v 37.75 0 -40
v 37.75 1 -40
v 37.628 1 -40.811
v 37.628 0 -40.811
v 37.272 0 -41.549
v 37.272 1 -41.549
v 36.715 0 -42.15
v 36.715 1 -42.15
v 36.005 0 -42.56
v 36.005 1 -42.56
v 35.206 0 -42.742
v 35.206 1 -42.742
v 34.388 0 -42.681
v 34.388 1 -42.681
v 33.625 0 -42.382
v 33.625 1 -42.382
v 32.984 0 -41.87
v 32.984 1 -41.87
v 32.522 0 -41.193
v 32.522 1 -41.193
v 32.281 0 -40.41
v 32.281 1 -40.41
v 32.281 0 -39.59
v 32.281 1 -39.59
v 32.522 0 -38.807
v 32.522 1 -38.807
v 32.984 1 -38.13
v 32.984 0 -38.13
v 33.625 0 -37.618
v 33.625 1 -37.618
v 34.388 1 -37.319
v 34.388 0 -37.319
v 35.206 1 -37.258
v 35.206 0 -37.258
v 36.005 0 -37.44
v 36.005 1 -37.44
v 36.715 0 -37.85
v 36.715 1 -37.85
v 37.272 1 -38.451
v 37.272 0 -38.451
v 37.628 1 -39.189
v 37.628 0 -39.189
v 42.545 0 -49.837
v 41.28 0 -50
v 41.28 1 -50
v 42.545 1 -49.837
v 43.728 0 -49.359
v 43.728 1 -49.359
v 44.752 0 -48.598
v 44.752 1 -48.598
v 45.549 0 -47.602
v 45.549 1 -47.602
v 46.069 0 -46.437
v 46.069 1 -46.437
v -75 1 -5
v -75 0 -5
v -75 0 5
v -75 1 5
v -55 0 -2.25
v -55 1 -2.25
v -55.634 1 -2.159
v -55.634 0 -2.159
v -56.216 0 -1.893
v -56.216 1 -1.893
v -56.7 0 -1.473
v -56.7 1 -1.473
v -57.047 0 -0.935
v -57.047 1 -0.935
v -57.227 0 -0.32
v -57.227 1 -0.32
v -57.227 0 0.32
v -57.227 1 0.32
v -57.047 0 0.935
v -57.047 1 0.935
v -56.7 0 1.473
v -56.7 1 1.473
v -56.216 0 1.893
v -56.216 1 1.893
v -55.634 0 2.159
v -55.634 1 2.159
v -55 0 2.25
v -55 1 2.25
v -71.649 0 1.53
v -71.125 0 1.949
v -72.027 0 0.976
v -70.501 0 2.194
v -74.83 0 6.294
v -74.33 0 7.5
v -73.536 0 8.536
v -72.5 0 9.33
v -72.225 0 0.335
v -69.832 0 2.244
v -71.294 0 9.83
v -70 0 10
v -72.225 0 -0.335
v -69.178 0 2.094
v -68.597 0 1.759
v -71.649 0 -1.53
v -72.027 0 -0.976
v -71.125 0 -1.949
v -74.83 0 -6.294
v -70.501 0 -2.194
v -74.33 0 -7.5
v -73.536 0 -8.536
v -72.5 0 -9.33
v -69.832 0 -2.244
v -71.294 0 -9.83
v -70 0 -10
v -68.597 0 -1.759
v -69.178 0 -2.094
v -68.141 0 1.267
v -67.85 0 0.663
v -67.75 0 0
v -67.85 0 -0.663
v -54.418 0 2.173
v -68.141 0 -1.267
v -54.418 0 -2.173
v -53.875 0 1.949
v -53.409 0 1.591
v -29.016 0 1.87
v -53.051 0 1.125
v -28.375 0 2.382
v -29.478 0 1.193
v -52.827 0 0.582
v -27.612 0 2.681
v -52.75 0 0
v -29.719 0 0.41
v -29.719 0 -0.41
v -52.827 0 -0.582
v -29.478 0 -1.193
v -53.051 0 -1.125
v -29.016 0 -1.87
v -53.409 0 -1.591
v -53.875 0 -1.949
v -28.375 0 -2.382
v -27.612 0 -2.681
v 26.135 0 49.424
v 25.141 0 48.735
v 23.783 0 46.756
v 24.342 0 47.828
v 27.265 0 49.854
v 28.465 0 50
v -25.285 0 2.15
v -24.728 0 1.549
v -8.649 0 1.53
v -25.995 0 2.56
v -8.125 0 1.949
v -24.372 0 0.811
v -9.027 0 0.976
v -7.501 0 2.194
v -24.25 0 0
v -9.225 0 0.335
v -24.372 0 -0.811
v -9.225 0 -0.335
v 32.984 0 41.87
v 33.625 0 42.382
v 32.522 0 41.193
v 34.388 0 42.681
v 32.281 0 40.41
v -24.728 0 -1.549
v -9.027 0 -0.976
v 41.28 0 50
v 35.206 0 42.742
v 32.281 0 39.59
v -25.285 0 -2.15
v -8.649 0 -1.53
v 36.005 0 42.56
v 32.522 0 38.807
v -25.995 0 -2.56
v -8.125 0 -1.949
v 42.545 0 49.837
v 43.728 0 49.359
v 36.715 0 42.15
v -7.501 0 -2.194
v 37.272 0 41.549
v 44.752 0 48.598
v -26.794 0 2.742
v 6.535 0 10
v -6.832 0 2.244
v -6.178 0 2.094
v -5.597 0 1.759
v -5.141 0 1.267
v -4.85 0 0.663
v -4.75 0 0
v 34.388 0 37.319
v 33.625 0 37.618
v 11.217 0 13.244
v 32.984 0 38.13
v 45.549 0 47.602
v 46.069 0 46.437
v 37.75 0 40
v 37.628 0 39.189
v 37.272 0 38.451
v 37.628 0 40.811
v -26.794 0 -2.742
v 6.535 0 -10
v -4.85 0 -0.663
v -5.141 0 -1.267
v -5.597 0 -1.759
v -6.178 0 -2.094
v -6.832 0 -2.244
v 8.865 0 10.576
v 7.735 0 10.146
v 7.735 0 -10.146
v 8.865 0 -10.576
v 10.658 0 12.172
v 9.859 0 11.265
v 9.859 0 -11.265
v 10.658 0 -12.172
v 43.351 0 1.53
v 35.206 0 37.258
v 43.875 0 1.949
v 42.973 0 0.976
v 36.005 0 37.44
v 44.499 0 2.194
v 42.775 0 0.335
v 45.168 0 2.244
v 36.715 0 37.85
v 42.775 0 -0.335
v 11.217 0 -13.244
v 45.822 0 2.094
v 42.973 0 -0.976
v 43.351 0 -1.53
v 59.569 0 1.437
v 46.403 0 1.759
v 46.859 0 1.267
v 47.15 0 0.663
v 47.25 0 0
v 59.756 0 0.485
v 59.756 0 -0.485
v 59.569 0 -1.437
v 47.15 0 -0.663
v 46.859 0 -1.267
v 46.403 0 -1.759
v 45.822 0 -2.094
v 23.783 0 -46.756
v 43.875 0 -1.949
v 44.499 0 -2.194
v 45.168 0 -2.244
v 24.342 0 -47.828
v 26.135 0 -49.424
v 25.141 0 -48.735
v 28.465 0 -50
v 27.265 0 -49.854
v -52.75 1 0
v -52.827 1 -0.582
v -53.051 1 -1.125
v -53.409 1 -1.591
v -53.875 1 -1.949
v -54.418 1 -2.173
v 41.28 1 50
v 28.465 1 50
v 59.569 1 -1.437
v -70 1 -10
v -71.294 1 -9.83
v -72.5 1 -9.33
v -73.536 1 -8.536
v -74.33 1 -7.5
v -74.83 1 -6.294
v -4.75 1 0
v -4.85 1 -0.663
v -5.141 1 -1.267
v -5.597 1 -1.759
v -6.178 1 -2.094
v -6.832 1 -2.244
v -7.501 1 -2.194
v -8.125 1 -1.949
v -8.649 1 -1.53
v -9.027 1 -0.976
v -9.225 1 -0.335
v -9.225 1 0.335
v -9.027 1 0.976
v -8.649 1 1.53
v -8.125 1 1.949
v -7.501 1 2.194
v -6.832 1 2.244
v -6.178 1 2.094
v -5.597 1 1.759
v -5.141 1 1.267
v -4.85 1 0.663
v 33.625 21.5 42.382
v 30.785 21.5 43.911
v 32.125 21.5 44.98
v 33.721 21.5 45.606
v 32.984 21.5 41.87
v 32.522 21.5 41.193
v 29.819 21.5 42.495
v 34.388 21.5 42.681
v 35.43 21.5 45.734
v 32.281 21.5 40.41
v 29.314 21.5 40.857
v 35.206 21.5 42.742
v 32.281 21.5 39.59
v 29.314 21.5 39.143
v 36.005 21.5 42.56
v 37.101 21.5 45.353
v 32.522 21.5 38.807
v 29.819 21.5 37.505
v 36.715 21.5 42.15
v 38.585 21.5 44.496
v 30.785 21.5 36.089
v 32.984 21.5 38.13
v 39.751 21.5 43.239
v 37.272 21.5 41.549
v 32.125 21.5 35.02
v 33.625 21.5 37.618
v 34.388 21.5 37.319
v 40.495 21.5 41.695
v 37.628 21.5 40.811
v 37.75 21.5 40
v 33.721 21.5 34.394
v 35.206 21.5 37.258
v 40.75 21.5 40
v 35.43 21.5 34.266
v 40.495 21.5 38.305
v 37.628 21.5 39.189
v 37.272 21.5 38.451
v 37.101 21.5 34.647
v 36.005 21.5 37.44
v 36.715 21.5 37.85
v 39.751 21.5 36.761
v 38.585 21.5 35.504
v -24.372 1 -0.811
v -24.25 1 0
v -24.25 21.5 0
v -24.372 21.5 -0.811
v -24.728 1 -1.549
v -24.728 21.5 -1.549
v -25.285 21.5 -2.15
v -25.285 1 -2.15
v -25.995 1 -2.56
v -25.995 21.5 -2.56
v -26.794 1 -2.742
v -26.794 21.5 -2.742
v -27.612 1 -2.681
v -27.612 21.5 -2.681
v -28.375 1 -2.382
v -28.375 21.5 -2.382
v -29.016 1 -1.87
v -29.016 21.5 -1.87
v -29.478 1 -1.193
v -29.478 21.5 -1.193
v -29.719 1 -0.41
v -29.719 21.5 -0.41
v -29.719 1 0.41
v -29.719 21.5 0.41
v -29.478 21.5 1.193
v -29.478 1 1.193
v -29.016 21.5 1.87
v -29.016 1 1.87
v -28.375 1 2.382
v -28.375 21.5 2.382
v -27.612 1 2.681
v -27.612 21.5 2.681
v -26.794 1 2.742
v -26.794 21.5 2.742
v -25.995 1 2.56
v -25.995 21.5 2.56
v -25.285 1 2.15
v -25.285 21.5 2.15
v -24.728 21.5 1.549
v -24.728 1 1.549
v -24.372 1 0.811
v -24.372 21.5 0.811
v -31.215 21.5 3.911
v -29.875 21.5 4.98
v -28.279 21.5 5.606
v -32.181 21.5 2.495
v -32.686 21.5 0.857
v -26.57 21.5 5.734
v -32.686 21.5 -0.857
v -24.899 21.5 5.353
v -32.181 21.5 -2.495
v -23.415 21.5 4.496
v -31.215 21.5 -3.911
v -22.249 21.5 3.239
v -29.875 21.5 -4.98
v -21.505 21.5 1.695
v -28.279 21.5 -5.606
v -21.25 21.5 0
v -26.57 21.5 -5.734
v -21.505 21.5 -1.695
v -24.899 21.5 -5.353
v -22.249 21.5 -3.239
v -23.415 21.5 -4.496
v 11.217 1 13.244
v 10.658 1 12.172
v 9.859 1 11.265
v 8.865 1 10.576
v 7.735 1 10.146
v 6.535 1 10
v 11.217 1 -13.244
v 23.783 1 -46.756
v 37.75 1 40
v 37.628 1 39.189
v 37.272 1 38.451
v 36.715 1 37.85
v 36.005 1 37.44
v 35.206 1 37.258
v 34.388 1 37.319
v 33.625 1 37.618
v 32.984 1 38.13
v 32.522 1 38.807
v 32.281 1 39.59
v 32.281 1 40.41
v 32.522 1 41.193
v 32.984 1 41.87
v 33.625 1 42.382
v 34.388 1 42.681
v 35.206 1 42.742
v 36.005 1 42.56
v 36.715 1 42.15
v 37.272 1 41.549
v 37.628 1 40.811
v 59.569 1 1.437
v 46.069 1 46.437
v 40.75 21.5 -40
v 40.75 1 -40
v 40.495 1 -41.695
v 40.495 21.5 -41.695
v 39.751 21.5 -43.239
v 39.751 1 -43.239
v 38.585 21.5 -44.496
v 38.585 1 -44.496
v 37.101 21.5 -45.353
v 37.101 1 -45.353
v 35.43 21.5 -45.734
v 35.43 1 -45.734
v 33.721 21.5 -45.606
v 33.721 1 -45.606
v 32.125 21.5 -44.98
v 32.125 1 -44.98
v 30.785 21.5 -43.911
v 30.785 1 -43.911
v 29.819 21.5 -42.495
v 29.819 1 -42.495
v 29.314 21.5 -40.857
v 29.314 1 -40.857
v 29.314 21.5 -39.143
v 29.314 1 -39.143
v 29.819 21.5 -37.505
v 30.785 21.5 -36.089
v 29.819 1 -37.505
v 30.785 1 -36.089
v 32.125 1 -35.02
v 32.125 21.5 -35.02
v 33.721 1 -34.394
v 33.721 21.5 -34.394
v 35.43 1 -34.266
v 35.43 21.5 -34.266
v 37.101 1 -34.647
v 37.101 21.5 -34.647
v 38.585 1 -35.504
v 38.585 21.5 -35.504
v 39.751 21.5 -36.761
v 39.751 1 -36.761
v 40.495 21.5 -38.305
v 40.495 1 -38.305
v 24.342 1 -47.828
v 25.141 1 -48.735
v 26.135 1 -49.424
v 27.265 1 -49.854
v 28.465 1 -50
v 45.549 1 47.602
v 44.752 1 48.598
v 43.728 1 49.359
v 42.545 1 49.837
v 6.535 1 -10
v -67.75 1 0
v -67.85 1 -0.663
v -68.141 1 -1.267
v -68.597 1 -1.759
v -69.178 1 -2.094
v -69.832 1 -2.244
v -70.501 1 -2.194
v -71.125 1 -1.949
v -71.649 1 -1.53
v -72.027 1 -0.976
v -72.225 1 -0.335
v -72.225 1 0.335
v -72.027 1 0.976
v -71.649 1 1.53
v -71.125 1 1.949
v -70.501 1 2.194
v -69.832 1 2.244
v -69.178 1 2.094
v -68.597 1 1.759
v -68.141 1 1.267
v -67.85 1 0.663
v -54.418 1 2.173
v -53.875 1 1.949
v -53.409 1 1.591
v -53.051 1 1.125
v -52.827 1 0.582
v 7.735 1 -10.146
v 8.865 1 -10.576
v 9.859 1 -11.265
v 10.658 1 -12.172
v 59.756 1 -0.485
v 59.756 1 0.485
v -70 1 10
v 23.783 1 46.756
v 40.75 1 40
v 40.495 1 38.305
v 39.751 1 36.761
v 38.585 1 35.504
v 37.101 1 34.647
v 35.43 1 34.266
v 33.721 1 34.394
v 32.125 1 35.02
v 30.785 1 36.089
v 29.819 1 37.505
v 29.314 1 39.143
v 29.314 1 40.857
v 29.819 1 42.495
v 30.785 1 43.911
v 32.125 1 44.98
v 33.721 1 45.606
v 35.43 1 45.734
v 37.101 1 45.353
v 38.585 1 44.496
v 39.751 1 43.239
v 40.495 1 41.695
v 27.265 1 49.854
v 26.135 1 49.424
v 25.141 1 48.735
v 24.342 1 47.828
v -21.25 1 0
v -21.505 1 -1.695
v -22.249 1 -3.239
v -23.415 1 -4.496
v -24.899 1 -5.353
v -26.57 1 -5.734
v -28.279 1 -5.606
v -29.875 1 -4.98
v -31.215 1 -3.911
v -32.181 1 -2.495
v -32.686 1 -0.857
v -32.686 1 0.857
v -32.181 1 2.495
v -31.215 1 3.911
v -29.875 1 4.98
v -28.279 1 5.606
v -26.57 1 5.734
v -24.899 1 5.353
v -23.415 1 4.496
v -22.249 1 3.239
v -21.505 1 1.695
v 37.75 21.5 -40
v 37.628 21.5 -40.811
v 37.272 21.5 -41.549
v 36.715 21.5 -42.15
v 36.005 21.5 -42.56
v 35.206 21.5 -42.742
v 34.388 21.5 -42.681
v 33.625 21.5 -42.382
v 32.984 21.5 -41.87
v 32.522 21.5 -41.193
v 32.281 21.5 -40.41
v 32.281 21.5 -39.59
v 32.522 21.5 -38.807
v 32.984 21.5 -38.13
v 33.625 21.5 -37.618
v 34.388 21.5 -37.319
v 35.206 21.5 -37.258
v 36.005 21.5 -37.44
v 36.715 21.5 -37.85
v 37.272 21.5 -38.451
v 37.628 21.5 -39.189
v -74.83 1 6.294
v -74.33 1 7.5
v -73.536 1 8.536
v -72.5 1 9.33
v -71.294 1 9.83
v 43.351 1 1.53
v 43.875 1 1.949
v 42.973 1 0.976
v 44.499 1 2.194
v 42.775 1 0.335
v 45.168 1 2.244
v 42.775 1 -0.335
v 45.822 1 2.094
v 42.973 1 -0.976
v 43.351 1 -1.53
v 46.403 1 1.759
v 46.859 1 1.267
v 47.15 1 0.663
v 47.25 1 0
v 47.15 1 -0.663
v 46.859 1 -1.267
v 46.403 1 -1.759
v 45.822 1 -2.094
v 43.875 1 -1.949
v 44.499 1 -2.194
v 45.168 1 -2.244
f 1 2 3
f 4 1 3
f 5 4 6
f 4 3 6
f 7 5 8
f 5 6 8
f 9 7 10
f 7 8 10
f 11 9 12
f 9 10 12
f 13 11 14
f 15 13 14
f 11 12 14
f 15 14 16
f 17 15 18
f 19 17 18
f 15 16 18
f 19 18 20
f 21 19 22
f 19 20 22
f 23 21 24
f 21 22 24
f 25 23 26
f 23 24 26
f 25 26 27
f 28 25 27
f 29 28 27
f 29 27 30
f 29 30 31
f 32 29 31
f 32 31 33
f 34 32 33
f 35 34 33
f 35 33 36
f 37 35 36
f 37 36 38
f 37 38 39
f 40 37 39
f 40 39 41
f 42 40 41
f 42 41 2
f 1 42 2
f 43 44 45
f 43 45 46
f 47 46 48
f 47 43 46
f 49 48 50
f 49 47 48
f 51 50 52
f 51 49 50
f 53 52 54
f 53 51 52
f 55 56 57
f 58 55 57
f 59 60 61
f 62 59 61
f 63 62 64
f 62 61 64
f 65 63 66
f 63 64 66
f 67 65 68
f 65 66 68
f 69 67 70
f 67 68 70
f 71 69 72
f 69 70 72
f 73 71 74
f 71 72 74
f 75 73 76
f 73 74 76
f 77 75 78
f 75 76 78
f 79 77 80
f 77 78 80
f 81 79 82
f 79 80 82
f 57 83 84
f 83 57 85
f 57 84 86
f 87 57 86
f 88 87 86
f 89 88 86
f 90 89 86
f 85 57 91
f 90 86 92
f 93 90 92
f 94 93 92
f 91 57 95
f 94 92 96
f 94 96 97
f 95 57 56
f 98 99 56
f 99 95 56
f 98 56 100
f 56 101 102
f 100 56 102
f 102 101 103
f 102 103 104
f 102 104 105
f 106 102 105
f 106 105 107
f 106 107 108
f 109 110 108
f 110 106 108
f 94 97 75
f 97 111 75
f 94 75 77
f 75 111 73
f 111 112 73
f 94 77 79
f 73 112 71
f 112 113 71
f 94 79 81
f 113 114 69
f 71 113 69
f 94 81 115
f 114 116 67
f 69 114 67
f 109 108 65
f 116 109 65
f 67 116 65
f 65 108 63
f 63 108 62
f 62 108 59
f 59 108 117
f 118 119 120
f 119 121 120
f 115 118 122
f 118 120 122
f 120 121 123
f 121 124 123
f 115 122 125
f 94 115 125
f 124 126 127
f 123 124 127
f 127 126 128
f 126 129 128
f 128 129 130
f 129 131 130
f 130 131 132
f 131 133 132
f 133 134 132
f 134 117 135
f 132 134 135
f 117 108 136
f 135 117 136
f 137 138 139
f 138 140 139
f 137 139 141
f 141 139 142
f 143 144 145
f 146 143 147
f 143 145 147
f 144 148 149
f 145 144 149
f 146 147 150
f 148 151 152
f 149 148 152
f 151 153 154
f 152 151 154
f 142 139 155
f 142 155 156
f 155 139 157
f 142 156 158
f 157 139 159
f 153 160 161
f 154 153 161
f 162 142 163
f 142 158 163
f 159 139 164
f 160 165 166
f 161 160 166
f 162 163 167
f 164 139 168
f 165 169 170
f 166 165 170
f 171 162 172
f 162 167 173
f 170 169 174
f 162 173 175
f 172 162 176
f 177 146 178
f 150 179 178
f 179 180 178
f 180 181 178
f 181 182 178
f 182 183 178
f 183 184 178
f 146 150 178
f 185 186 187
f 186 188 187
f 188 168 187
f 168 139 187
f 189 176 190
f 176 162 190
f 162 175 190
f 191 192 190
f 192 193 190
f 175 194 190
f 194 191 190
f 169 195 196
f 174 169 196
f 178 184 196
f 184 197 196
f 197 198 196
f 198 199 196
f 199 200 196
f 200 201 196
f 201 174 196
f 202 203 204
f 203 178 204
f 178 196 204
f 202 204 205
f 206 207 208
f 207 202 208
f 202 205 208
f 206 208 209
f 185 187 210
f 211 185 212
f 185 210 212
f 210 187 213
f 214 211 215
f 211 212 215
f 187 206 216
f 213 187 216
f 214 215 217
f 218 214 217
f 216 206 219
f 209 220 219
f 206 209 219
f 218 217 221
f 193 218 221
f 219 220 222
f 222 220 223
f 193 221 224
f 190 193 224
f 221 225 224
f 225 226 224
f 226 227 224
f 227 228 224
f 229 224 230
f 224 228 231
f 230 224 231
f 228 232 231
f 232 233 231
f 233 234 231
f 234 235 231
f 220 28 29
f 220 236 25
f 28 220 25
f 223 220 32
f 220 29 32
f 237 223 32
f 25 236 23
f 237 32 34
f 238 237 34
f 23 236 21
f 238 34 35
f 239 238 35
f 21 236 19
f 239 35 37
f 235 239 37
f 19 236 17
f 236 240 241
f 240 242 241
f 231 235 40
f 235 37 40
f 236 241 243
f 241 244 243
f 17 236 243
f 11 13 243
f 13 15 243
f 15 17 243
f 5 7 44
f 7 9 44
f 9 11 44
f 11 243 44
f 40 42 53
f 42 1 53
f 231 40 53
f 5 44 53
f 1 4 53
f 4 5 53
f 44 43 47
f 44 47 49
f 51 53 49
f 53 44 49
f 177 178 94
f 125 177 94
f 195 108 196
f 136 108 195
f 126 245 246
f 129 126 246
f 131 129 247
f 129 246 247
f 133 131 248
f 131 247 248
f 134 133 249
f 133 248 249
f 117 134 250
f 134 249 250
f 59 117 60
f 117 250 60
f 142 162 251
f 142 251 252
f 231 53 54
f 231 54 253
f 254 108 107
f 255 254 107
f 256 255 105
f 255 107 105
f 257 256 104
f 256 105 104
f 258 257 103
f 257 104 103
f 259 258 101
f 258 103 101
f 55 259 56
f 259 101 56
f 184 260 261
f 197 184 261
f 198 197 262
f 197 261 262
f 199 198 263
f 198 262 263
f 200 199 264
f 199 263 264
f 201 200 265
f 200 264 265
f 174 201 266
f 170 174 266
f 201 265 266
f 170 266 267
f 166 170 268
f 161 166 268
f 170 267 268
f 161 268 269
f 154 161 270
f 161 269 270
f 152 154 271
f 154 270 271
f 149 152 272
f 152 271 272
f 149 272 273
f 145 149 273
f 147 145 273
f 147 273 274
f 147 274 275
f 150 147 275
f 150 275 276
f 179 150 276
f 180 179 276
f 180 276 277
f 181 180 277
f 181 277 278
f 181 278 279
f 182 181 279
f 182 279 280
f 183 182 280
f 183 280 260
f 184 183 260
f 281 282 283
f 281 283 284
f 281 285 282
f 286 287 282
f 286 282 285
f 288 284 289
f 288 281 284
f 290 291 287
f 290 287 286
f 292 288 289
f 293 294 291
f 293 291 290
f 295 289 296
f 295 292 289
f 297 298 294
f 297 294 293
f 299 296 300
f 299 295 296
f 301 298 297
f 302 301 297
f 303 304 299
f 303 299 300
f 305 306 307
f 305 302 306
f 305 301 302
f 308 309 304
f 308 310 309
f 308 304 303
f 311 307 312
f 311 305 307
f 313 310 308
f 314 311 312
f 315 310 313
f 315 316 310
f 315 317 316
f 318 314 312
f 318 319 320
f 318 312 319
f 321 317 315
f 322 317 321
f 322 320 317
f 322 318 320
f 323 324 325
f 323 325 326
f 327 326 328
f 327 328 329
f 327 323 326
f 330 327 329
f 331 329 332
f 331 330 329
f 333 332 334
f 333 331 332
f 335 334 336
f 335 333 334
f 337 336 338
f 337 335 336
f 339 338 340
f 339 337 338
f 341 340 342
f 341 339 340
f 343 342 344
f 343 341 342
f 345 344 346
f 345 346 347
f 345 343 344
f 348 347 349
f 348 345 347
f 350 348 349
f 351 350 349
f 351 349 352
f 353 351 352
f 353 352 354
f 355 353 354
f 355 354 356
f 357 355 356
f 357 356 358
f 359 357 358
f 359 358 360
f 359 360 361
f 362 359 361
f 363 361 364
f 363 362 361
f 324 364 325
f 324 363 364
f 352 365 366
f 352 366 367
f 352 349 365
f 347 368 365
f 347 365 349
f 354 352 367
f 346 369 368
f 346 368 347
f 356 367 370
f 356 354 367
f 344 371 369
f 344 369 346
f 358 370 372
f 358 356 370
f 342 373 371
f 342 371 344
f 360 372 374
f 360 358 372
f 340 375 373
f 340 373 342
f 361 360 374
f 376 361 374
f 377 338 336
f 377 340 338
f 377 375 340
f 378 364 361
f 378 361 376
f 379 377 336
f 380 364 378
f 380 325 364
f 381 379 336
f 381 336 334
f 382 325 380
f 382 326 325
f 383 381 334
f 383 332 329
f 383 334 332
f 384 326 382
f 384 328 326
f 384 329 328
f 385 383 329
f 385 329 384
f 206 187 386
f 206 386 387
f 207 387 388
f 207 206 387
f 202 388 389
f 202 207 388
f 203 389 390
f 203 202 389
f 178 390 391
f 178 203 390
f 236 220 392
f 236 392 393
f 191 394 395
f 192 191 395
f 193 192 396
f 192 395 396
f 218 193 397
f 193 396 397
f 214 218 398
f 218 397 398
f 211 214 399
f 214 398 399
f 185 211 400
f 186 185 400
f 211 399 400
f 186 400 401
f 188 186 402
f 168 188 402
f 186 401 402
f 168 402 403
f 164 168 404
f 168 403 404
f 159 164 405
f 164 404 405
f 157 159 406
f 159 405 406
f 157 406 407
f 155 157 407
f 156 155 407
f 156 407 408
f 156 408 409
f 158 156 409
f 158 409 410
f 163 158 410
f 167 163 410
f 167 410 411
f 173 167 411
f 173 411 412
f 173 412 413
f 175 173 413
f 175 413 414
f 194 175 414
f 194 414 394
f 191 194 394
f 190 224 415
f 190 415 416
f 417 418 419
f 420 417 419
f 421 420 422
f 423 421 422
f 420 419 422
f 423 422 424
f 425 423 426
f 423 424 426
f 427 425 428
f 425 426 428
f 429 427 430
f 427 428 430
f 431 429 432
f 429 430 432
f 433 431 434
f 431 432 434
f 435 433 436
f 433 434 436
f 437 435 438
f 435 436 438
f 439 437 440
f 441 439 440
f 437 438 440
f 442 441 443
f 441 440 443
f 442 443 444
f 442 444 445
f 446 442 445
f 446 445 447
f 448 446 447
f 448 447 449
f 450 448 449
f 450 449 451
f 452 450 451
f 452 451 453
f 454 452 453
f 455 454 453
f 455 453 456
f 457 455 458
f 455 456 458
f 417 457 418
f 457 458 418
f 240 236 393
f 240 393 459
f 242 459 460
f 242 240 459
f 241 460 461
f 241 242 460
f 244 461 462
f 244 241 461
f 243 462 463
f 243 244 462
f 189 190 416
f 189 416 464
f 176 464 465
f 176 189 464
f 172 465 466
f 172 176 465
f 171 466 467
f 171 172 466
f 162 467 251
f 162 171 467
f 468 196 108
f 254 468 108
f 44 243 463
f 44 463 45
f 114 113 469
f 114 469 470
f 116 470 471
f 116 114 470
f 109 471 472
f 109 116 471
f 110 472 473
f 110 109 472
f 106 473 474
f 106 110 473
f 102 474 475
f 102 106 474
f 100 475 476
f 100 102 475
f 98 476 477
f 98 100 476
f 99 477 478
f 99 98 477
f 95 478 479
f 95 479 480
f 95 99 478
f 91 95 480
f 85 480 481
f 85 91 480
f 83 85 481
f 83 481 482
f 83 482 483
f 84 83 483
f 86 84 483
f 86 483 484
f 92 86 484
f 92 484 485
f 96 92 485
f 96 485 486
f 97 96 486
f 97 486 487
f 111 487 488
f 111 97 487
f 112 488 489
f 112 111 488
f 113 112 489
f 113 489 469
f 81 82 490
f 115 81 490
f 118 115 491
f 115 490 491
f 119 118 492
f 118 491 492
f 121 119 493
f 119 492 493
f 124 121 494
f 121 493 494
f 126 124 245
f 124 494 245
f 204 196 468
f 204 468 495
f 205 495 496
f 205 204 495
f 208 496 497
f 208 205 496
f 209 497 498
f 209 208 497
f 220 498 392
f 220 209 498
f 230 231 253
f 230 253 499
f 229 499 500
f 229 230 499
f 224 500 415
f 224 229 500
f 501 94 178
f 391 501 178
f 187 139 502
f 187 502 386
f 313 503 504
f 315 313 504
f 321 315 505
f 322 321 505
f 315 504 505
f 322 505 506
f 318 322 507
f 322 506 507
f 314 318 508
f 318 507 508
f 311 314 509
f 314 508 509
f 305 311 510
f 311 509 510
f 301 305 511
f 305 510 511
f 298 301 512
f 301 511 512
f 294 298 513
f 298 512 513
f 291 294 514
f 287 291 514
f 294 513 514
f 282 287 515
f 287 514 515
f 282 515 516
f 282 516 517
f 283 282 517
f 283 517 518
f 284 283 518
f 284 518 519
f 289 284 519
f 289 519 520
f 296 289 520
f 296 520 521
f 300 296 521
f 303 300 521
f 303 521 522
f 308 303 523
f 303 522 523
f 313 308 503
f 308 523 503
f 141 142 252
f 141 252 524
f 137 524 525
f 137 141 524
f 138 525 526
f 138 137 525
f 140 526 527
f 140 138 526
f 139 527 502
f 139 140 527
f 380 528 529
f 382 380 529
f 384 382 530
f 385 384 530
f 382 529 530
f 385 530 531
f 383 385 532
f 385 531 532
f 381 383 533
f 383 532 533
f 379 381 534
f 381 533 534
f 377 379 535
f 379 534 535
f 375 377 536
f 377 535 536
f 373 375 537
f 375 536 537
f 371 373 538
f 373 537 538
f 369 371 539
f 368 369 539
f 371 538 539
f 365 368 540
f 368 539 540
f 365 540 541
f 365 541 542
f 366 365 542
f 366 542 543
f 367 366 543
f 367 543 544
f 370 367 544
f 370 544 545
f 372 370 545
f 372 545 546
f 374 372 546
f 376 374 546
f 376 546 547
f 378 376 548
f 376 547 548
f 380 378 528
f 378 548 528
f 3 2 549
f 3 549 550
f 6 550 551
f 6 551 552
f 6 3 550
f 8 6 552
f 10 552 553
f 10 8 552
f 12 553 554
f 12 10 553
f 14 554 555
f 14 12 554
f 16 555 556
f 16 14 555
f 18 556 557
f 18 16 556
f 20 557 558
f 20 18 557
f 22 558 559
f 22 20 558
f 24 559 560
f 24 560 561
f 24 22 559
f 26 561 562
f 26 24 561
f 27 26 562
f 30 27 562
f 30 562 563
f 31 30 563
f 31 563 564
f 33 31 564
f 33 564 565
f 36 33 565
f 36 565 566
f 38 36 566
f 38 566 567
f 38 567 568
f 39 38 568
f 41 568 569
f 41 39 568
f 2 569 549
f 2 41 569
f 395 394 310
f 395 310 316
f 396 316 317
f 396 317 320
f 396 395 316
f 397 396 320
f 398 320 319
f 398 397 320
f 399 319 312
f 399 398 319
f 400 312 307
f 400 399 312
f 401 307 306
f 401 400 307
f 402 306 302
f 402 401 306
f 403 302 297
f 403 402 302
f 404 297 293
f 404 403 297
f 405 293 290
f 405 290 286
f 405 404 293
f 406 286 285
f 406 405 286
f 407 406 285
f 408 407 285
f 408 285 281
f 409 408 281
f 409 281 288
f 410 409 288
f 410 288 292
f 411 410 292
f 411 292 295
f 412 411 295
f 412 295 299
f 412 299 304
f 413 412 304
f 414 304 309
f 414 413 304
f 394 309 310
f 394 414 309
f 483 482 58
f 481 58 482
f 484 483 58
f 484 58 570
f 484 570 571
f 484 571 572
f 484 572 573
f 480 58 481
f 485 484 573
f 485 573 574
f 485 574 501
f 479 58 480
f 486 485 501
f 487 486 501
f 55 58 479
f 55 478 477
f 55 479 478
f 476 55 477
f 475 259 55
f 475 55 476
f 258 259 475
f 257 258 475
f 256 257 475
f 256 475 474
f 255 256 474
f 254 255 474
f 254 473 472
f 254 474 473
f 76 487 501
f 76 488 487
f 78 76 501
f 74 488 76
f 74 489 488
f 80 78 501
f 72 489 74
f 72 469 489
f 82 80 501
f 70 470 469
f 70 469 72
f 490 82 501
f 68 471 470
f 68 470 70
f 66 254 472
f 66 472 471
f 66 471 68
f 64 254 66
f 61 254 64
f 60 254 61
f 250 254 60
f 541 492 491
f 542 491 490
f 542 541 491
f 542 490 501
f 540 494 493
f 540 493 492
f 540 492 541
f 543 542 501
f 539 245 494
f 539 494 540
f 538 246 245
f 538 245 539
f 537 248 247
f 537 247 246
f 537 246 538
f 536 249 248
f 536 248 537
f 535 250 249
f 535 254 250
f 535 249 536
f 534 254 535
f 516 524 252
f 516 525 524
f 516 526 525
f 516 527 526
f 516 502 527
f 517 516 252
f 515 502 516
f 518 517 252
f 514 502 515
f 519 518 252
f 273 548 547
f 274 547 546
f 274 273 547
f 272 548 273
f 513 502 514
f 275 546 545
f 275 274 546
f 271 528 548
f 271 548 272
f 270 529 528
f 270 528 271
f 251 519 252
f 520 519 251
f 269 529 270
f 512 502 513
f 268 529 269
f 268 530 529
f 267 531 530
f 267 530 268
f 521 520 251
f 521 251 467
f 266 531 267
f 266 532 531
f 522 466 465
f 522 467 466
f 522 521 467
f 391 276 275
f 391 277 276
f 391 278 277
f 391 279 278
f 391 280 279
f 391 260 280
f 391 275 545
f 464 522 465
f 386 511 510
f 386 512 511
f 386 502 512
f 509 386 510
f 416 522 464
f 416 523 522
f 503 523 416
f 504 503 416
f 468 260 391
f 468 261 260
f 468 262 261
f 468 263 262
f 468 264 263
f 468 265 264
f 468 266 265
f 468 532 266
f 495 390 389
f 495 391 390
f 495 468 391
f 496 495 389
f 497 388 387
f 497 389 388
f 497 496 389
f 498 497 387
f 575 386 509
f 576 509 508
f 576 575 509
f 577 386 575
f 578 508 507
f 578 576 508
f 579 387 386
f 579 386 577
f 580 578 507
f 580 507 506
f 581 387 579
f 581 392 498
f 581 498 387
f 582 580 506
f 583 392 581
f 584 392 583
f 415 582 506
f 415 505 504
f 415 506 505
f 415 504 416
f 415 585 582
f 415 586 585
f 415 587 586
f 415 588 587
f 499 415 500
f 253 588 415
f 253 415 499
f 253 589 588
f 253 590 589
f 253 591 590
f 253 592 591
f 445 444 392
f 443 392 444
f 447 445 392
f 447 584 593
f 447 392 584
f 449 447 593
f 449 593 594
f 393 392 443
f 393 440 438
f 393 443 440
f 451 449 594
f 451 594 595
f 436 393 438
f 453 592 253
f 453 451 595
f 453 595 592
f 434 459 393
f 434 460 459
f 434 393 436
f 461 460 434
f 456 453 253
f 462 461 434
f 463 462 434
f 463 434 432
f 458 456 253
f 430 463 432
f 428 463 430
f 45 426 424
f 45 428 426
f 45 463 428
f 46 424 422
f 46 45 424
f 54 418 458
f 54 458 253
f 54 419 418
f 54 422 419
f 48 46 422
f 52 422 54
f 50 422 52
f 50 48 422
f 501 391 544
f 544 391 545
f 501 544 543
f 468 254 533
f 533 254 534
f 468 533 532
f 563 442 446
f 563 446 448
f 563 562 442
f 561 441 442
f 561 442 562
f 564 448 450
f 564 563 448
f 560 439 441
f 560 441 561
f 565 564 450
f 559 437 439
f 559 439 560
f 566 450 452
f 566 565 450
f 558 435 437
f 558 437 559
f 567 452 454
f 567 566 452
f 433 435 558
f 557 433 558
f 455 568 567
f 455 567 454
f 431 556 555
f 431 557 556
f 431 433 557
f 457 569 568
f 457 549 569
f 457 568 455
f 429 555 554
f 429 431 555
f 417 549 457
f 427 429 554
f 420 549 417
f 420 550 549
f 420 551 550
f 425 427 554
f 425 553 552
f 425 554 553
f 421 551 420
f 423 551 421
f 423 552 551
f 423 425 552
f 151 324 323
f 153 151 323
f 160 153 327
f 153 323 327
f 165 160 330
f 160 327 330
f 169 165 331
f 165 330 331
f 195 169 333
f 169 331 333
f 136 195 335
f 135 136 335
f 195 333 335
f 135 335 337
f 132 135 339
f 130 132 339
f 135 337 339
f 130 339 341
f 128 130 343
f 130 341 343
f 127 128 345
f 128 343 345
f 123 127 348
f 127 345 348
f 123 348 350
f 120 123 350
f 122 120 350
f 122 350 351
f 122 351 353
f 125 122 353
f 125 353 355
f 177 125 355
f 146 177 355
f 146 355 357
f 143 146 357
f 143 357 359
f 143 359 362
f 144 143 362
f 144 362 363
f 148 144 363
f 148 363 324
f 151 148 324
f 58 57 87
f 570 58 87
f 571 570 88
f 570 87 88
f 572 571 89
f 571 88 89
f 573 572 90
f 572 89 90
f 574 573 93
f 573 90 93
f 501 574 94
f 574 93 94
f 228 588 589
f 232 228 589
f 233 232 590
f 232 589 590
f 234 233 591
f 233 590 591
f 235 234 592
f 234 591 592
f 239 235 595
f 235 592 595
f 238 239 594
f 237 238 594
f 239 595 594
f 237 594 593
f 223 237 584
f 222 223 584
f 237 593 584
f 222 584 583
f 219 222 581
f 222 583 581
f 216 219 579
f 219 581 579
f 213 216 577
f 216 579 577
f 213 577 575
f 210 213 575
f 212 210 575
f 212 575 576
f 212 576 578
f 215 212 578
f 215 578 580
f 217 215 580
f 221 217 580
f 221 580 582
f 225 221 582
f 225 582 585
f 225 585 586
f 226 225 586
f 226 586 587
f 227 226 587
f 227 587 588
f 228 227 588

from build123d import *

# Parameters (mm, degrees)
BOSS_EXTRUDE1_DEPTH = 1
SKETCH2_R           = 2.75
CUT_EXTRUDE1_DEPTH  = 2
SKETCH3_R           = 5.75
SKETCH3_R_2         = 2.75
BOSS_EXTRUDE2_DEPTH = 20.5
SKETCH4_R           = 2.25
CUT_EXTRUDE2_DEPTH  = 2
SKETCH5_R           = 2.25
BOSS_EXTRUDE3_DEPTH = 1
SKETCH6_R           = 2.25
CUT_EXTRUDE3_DEPTH  = 2


with BuildPart() as part:
    # Sketch1 → Boss-Extrude1 (new body)
    with BuildSketch(Plane(origin=(0, 0, 0), x_dir=(1, 0, 0), z_dir=(0, 1, 0))):
        with BuildLine():
            Line((-55, 10), (6.534997659, 10))
            ThreePointArc((6.534997659, 10), (9.382971848, 10.890371912), (11.216643547, 13.244382792))
            Line((11.216643547, 13.244382792), (23.783356453, 46.755617208))
            ThreePointArc((23.783356453, 46.755617208), (25.617028152, 49.109628088), (28.465002341, 50))
            Line((28.465002341, 50), (41.279846746, 50))
            ThreePointArc((41.279846746, 50), (44.264499394, 49.011464641), (46.068978172, 46.436739428))
            Line((46.068978172, 46.436739428), (59.568978172, 1.436739428))
            ThreePointArc((59.568978172, 1.436739428), (59.779846746, 0), (59.568978172, -1.436739428))
            Line((59.568978172, -1.436739428), (46.068978172, -46.436739428))
            ThreePointArc((46.068978172, -46.436739428), (44.264499394, -49.011464641), (41.279846746, -50))
            Line((41.279846746, -50), (28.465002341, -50))
            ThreePointArc((28.465002341, -50), (25.617028152, -49.109628088), (23.783356453, -46.755617208))
            Line((23.783356453, -46.755617208), (11.216643547, -13.244382792))
            ThreePointArc((11.216643547, -13.244382792), (9.382971848, -10.890371912), (6.534997659, -10))
            Line((6.534997659, -10), (-55, -10))
            ThreePointArc((-55, -10), (-58.535533906, -8.535533906), (-60, -5))
            Line((-60, -5), (-60, 5))
            ThreePointArc((-60, 5), (-58.535533906, 8.535533906), (-55, 10))
        make_face()
    extrude(amount=BOSS_EXTRUDE1_DEPTH)

    # Sketch2 → Cut-Extrude1 (cut, through all)
    with BuildSketch(Plane(origin=(0, 1, 0), x_dir=(1, 0, 0), z_dir=(0, 1, 0))):
        with Locations((-27, 0)):
            Circle(SKETCH2_R)
        with Locations((35, 40)):
            Circle(SKETCH2_R)
        with Locations((35, -40)):
            Circle(SKETCH2_R)
    extrude(amount=-CUT_EXTRUDE1_DEPTH, mode=Mode.SUBTRACT)

    # Sketch3 → Boss-Extrude2 (add)
    with BuildSketch(Plane(origin=(0, 1, 0), x_dir=(1, 0, 0), z_dir=(0, 1, 0))):
        with Locations((-27, 0)):
            Circle(SKETCH3_R)
        with Locations((-27, 0)):
            Circle(SKETCH3_R_2, mode=Mode.SUBTRACT)
        with Locations((35, 40)):
            Circle(SKETCH3_R)
        with Locations((35, 40)):
            Circle(SKETCH3_R_2, mode=Mode.SUBTRACT)
        with Locations((35, -40)):
            Circle(SKETCH3_R)
        with Locations((35, -40)):
            Circle(SKETCH3_R_2, mode=Mode.SUBTRACT)
    extrude(amount=BOSS_EXTRUDE2_DEPTH)

    # Sketch4 → Cut-Extrude2 (cut, through all)
    with BuildSketch(Plane(origin=(0, 1, 0), x_dir=(1, 0, 0), z_dir=(0, 1, 0))):
        with Locations((-55, 0)):
            Circle(SKETCH4_R)
        with Locations((45, 0)):
            Circle(SKETCH4_R)
        with Locations((-7, 0)):
            Circle(SKETCH4_R)
    extrude(amount=-CUT_EXTRUDE2_DEPTH, mode=Mode.SUBTRACT)

    # Sketch5 → Boss-Extrude3 (add)
    with BuildSketch(Plane(origin=(0, 0, 0), x_dir=(1, 0, 0), z_dir=(0, 1, 0))):
        with BuildLine():
            Line((-55, 10), (-70, 10))
            ThreePointArc((-70, 10), (-73.535533906, 8.535533906), (-75, 5))
            Line((-75, 5), (-75, -5))
            ThreePointArc((-75, -5), (-73.535533906, -8.535533906), (-70, -10))
            Line((-70, -10), (-55, -10))
            Line((-55, -10), (-55, 10))
        make_face()
        with Locations((-70, 0)):
            Circle(SKETCH5_R, mode=Mode.SUBTRACT)
    extrude(amount=BOSS_EXTRUDE3_DEPTH)

    # Sketch6 → Cut-Extrude3 (cut, through all)
    with BuildSketch(Plane(origin=(0, 1, 0), x_dir=(1, 0, 0), z_dir=(0, 1, 0))):
        with Locations((-55, 0)):
            Circle(SKETCH6_R)
    extrude(amount=-CUT_EXTRUDE3_DEPTH, mode=Mode.SUBTRACT)


solid = part.part
